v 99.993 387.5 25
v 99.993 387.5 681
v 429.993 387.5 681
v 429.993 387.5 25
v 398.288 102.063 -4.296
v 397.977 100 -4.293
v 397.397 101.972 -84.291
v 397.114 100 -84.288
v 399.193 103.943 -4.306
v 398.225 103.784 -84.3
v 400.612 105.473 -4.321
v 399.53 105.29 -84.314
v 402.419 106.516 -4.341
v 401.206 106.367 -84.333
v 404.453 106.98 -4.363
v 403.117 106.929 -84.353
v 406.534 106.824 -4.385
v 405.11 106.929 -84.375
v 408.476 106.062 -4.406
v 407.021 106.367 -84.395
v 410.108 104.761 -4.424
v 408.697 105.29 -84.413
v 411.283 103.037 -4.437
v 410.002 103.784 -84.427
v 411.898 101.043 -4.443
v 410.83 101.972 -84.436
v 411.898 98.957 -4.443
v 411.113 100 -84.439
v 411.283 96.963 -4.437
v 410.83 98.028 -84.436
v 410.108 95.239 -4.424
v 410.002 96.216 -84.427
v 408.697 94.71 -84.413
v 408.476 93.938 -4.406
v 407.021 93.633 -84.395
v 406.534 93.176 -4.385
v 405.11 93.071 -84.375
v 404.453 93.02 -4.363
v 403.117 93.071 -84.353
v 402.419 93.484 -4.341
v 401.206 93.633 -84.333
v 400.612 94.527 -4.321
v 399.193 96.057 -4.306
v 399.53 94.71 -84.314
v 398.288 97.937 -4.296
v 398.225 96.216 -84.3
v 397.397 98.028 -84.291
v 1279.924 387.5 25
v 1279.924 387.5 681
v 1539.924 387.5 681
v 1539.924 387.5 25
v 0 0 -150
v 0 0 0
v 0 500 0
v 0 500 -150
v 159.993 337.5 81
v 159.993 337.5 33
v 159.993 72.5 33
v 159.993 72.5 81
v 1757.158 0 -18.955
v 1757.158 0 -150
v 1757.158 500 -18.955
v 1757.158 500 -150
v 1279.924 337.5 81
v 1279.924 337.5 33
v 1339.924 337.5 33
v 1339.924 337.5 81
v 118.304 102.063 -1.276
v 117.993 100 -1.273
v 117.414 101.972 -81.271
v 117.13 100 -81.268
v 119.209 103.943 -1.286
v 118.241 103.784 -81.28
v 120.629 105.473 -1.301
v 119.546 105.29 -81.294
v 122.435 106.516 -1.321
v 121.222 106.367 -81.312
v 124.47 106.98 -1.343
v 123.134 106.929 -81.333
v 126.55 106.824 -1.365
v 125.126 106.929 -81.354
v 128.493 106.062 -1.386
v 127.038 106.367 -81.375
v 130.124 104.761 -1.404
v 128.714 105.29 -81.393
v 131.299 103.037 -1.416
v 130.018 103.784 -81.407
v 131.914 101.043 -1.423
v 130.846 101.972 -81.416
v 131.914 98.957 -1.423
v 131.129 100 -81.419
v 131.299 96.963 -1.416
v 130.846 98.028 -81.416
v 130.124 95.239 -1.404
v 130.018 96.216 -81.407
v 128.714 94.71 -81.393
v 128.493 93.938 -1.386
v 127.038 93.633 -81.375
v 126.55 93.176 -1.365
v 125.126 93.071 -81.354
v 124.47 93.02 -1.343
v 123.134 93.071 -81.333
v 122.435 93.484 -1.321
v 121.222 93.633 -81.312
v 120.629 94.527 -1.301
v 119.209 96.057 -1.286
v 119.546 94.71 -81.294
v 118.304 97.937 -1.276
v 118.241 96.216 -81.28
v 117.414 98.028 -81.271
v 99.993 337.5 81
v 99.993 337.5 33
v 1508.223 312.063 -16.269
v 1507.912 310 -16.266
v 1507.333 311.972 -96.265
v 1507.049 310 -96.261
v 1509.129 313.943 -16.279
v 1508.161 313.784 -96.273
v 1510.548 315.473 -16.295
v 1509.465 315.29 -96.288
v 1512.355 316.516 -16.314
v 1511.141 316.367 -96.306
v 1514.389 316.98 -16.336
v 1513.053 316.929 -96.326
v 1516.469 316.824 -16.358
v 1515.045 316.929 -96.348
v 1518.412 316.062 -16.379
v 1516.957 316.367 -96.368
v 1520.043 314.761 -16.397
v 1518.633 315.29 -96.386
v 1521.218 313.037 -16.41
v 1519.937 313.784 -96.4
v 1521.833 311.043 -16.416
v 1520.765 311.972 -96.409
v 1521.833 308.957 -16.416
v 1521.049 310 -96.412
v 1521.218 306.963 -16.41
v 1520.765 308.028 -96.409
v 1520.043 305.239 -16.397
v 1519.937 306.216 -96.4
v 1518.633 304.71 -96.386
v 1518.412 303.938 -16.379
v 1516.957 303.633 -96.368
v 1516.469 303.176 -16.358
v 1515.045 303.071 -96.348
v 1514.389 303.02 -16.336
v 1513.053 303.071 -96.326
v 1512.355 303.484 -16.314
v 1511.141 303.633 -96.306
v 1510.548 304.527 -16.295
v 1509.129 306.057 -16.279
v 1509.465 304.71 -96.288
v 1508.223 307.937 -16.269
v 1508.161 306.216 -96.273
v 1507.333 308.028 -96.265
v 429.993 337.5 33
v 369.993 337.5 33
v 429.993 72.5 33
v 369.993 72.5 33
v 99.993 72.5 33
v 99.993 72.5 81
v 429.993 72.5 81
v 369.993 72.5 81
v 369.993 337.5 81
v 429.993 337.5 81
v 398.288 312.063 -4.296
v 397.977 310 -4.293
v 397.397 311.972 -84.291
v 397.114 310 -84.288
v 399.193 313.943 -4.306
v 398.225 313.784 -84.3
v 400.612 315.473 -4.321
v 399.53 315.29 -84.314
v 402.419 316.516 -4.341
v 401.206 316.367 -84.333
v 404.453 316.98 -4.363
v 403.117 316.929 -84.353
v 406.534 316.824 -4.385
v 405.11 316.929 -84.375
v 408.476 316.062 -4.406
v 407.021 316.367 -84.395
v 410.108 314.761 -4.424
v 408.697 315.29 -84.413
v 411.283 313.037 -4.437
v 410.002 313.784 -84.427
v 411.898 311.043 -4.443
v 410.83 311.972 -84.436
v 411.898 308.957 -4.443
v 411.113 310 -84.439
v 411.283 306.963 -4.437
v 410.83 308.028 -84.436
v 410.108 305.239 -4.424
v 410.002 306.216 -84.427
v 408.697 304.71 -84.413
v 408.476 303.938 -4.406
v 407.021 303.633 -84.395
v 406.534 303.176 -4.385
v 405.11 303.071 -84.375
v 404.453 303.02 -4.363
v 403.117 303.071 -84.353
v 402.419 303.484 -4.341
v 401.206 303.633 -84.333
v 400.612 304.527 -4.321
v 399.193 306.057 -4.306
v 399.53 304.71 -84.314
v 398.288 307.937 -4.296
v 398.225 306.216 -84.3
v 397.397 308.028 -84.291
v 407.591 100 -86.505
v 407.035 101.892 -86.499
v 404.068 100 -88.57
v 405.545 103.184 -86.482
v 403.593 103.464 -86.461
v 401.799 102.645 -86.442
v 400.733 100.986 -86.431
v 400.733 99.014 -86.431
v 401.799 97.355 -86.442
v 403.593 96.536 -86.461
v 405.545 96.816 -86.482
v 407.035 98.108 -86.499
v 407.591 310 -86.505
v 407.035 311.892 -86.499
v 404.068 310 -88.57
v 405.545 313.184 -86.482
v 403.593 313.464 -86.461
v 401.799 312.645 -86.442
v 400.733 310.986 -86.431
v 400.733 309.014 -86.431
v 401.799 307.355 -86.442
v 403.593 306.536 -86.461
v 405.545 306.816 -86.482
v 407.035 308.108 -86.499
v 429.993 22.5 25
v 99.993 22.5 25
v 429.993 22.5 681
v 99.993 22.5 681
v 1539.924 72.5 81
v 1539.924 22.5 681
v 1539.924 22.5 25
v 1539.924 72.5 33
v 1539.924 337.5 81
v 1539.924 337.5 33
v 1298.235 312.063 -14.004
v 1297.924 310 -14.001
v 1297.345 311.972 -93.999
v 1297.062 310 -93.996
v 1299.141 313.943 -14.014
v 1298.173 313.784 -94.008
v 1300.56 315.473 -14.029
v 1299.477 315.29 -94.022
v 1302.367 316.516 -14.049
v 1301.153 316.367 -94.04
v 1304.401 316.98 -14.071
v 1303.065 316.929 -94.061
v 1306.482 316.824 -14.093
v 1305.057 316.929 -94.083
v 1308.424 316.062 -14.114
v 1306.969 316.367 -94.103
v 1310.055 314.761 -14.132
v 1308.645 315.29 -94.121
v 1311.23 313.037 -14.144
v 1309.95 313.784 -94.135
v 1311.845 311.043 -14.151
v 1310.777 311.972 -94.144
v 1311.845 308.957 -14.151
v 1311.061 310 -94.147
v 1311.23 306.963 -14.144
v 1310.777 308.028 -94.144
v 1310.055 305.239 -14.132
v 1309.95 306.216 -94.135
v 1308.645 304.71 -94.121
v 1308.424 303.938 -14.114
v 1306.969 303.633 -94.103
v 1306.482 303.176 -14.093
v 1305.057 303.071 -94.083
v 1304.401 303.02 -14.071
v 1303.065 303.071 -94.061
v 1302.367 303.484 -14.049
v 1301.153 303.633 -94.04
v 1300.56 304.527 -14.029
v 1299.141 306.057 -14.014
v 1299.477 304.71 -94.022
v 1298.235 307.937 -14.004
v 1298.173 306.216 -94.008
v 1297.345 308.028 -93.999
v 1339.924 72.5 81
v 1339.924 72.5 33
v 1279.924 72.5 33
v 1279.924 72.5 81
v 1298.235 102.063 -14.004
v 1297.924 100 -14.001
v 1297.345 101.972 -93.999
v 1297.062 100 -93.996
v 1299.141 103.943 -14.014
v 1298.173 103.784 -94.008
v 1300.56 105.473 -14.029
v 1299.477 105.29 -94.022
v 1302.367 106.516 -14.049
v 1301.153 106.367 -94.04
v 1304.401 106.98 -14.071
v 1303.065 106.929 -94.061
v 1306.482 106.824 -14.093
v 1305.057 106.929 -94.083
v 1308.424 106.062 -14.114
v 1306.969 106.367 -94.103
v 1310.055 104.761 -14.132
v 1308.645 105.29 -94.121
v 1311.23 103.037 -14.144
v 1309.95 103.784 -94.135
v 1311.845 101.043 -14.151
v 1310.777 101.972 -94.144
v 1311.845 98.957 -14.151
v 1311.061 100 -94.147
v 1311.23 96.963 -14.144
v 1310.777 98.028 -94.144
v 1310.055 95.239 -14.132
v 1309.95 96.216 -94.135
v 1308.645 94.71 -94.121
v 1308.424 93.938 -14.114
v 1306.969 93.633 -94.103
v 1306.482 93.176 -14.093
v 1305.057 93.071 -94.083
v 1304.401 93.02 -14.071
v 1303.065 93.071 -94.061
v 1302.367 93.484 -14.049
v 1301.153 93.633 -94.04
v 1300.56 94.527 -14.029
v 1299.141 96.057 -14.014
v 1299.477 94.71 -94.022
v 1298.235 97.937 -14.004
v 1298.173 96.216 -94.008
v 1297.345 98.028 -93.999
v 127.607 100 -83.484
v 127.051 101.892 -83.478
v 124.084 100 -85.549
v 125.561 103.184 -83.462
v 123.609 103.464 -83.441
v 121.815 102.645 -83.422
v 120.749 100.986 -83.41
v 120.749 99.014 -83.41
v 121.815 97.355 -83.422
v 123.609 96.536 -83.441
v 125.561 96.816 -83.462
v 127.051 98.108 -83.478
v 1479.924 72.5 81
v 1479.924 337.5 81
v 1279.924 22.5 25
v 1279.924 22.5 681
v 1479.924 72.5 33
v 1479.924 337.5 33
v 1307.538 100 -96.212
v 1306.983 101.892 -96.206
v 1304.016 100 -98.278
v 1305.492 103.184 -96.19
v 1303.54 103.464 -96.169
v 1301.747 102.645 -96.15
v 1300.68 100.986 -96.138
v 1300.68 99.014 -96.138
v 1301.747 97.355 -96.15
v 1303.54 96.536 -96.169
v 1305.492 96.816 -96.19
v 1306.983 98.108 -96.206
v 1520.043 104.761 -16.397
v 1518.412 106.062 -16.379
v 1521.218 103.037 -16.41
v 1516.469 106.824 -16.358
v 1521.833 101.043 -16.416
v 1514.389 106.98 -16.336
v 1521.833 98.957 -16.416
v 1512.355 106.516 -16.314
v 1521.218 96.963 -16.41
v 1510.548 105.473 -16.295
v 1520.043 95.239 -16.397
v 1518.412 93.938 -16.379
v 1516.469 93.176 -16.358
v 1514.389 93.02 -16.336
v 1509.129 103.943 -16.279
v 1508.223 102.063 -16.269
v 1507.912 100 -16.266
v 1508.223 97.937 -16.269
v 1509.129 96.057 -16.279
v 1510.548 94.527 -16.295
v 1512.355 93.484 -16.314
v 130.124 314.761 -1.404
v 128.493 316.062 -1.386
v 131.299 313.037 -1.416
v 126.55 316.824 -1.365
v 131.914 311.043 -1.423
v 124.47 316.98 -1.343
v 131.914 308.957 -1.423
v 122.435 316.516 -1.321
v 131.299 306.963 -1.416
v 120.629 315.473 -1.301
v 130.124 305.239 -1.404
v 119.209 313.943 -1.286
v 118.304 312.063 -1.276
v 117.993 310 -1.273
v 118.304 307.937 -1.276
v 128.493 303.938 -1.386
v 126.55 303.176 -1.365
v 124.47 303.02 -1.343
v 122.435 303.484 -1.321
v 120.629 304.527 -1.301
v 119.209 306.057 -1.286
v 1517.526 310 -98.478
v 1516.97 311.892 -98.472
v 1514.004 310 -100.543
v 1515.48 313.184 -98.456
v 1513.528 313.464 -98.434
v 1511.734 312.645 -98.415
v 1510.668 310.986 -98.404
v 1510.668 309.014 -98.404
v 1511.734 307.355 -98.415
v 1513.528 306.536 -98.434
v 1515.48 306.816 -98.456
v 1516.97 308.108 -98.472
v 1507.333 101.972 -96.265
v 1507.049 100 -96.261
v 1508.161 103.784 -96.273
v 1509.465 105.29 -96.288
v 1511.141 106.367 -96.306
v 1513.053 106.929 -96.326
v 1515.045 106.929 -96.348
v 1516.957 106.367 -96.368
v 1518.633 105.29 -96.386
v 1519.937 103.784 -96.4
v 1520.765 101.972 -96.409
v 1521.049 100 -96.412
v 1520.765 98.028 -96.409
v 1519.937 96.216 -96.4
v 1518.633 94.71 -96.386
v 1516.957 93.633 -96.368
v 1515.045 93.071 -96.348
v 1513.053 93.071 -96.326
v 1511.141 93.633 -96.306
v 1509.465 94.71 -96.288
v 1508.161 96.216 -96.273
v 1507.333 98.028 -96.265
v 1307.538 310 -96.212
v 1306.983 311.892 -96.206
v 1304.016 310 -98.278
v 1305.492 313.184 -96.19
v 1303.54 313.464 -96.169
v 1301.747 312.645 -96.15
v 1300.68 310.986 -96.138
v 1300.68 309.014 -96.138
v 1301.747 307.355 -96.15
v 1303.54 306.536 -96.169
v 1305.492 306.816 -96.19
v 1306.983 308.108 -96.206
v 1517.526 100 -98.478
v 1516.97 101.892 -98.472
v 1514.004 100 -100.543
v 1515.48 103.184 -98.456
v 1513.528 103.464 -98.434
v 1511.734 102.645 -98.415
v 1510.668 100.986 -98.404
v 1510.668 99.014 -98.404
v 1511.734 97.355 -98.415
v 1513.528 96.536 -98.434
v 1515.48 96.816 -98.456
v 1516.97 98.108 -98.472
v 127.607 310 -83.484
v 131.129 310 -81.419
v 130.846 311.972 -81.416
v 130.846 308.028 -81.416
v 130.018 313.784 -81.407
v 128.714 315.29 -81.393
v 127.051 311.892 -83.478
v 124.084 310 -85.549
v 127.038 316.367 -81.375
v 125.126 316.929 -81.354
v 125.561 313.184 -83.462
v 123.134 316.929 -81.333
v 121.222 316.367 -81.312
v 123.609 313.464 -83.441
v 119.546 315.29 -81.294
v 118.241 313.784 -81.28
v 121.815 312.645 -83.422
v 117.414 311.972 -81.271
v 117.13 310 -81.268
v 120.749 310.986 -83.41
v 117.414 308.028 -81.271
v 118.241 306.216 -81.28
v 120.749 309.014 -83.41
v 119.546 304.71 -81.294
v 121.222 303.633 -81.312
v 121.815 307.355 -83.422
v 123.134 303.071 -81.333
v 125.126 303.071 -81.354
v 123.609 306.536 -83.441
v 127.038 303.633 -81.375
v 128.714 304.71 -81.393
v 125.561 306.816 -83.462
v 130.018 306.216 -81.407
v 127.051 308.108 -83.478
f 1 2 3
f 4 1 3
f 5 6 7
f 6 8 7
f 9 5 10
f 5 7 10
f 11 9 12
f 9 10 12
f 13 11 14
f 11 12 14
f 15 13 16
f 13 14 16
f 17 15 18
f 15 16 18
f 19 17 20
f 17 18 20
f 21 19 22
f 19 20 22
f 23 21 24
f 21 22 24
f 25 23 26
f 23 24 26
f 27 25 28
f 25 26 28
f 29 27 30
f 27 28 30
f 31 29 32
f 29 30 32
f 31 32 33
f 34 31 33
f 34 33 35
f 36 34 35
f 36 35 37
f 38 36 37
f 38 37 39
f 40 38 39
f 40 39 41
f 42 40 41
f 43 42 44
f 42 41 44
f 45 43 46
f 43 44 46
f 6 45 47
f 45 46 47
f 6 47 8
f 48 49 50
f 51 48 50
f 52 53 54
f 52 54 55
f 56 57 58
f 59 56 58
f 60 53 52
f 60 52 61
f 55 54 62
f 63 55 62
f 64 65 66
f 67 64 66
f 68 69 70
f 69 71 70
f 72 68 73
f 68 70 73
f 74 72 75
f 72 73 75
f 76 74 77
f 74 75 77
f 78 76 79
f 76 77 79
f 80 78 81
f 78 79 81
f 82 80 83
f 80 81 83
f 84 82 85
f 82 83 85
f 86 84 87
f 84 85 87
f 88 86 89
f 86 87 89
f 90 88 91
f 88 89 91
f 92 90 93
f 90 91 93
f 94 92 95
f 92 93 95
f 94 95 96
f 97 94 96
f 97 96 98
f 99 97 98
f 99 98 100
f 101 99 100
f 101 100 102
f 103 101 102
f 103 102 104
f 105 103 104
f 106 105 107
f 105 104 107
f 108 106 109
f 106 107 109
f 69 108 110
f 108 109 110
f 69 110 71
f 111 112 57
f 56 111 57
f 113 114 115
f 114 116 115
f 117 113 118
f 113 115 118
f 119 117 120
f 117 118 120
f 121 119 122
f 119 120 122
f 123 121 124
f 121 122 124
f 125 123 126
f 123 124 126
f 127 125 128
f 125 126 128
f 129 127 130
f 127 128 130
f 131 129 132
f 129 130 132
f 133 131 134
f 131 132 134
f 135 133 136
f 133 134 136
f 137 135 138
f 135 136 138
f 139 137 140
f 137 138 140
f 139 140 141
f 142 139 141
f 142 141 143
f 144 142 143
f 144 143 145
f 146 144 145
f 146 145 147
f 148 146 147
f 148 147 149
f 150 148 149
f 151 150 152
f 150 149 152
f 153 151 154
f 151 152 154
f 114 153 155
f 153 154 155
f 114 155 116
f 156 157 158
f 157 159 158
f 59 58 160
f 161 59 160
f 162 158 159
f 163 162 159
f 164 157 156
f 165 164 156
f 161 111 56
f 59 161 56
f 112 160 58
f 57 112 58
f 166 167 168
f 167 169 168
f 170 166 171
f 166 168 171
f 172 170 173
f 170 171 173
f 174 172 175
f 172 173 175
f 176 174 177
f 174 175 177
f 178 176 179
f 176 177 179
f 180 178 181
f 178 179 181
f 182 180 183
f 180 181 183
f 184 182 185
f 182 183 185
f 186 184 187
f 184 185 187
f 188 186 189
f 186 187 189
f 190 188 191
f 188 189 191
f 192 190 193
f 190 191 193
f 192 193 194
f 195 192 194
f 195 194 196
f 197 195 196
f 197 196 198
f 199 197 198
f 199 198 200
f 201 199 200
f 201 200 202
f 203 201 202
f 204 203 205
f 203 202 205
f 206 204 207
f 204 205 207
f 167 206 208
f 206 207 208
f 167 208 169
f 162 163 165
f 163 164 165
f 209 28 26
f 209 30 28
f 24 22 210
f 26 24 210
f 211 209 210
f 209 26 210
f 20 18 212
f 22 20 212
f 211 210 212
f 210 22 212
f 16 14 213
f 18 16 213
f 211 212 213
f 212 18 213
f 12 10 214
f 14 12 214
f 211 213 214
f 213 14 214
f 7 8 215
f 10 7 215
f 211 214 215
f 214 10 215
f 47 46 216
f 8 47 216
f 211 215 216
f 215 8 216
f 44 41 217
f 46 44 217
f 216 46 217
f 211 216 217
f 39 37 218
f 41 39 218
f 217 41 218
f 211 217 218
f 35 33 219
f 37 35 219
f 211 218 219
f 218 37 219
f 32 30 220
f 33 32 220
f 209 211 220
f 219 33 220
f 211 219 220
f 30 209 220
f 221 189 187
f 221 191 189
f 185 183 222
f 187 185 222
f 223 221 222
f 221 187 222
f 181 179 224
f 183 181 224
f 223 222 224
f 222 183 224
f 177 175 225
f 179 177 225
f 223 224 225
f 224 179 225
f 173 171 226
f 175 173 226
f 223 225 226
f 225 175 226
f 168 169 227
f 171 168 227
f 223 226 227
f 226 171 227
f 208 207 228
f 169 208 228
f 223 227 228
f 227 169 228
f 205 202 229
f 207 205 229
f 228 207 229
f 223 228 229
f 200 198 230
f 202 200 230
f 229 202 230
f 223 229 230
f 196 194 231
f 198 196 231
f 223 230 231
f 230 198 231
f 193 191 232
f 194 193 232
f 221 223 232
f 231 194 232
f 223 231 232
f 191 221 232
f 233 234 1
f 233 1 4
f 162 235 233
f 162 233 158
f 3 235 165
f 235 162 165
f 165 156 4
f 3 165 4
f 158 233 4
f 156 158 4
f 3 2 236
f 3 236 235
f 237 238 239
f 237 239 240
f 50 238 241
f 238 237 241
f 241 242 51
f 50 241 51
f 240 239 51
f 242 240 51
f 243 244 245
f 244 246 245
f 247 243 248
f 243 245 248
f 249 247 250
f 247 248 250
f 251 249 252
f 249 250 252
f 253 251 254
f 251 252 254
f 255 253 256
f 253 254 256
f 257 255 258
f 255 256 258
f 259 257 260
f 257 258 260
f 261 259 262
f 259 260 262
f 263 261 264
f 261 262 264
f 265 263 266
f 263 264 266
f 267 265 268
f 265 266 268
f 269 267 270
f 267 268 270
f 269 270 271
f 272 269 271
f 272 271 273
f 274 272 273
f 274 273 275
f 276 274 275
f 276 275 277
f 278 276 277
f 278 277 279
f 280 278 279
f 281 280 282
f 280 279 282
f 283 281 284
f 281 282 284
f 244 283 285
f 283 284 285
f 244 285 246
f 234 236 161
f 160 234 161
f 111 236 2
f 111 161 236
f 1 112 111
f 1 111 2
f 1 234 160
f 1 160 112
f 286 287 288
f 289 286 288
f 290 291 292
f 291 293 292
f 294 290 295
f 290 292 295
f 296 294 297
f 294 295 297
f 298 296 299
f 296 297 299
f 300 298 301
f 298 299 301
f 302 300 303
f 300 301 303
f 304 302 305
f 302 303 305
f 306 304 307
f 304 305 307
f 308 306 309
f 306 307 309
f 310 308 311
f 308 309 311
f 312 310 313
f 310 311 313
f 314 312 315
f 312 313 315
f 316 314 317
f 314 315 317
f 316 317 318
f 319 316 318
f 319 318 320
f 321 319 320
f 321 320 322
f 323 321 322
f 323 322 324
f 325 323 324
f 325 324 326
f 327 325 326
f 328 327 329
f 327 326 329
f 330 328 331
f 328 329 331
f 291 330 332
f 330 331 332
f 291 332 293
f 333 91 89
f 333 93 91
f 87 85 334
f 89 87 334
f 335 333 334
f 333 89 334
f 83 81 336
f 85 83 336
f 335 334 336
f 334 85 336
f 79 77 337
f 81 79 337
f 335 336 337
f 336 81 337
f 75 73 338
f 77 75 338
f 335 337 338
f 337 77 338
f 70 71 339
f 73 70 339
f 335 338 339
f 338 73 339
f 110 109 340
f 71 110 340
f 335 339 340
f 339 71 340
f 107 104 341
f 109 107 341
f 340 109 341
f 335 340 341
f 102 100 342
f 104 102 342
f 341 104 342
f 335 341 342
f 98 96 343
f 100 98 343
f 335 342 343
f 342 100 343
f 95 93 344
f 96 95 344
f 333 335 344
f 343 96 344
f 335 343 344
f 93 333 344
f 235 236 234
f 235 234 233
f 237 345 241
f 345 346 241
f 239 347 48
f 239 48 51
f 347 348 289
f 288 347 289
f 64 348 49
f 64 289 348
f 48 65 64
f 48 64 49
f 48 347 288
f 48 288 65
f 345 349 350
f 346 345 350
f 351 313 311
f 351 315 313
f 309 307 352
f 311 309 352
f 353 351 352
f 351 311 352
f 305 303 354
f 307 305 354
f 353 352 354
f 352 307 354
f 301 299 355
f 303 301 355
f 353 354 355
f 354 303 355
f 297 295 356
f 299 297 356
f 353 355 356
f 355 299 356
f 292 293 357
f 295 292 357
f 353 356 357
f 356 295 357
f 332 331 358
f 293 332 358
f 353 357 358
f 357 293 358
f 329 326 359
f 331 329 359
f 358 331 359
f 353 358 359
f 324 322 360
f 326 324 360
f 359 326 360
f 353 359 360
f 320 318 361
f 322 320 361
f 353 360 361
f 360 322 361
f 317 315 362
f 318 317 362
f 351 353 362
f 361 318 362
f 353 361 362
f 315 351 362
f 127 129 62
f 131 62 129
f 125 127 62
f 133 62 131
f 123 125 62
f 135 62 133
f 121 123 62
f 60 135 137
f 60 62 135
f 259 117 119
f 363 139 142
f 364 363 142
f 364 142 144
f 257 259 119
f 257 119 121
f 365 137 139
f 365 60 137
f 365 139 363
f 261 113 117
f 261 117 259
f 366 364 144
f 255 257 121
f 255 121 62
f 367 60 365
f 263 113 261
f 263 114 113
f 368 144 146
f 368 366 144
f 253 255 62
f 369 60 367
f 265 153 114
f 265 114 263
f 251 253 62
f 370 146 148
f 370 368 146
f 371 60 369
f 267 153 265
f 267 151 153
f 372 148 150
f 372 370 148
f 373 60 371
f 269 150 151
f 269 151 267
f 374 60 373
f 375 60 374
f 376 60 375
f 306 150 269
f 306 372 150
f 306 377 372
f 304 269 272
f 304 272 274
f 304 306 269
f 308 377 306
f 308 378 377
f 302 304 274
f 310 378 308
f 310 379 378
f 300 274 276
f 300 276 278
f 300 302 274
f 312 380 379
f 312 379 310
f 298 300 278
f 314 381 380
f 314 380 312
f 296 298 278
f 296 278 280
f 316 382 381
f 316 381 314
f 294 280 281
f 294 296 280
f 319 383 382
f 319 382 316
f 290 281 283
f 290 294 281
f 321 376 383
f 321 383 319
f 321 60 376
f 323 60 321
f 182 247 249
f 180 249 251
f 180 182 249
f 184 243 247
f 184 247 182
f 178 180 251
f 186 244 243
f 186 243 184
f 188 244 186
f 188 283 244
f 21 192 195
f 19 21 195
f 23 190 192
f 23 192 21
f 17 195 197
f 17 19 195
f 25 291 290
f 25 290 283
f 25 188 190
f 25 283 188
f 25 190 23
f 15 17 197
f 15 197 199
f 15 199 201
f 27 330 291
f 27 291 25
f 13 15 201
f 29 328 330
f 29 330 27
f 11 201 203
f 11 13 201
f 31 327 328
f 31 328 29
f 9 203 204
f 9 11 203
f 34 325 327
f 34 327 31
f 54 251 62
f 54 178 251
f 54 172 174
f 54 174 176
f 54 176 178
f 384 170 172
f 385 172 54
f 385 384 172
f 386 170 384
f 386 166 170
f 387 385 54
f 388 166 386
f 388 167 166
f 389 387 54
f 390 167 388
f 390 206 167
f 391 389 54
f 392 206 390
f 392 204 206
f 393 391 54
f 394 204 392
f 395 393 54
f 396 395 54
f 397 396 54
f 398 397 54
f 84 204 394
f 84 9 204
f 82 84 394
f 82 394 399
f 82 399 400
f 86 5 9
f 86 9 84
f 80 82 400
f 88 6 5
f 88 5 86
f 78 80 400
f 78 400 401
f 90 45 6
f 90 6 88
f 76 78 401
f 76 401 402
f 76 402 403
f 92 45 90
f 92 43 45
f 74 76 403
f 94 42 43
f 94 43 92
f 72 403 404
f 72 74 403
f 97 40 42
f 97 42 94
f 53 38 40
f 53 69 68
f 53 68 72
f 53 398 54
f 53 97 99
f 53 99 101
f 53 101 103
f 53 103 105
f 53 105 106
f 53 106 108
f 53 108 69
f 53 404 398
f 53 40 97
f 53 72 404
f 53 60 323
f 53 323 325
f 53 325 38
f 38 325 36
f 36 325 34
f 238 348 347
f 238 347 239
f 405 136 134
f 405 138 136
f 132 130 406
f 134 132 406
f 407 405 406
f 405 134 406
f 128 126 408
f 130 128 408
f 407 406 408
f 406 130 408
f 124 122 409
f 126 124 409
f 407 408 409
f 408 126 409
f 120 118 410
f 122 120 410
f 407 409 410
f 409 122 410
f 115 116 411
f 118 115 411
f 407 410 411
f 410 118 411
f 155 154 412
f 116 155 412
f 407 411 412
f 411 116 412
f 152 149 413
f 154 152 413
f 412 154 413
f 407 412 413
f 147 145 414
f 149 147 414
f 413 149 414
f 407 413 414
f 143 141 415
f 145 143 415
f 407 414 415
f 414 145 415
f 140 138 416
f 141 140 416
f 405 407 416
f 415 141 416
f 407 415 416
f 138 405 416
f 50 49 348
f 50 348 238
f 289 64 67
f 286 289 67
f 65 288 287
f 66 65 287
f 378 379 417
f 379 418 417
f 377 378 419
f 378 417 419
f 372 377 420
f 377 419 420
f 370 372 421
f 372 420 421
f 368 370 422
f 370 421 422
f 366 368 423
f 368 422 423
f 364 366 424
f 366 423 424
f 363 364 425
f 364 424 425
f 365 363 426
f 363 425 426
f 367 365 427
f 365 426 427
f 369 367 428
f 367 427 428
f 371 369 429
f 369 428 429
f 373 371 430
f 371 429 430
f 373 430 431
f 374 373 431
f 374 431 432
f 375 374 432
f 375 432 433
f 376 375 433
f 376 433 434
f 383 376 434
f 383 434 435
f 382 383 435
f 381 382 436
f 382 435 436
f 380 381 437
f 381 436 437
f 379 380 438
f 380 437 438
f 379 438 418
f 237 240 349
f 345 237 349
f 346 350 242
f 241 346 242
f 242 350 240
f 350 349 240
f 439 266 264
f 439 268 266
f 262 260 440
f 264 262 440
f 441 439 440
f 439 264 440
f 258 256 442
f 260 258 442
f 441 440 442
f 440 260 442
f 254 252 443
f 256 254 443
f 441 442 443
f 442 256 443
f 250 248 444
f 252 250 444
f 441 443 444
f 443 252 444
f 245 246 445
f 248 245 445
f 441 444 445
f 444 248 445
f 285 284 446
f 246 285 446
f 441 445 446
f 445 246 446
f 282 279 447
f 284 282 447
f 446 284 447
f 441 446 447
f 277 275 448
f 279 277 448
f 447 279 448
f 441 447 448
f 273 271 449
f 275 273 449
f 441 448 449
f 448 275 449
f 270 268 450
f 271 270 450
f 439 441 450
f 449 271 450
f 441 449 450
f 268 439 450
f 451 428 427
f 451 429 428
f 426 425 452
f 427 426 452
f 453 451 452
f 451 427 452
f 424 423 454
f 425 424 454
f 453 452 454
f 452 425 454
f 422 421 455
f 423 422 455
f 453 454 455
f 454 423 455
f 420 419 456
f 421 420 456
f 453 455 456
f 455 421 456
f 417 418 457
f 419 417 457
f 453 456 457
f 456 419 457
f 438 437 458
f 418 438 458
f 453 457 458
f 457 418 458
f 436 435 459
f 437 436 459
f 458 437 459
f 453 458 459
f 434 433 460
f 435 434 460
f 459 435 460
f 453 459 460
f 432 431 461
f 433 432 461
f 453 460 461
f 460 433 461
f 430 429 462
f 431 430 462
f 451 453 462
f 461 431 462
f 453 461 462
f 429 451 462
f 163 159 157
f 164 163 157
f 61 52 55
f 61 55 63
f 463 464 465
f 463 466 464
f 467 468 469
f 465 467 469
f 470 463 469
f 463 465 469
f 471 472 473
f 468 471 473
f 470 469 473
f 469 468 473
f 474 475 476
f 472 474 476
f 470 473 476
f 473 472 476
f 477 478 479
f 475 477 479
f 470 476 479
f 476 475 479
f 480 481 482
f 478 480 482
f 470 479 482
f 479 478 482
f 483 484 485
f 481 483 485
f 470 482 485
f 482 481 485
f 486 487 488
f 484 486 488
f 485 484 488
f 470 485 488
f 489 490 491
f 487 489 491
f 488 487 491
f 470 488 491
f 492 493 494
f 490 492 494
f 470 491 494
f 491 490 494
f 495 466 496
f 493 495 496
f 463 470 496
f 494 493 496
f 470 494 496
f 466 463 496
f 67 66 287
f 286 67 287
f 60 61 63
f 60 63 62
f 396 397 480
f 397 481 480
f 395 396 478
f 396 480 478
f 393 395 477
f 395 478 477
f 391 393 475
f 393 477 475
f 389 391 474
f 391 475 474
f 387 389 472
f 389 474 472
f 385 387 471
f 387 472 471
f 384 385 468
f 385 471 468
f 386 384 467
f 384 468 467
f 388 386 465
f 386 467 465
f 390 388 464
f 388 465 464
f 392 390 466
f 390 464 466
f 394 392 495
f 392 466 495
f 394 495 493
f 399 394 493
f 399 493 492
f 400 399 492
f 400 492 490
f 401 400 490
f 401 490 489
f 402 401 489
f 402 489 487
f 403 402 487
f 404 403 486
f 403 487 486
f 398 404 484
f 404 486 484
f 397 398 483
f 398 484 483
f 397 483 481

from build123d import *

# Parameters (mm, degrees)
F1_DEPTH  = 500
F3_D      = 14
F3_DEPTH  = 80
F3_TIP    = 4.2060243332
F5_W      = 330
F5_H      = 365
F6_DEPTH  = 8
F5_W_2    = 260
F9_DEPTH  = 48
F11_W     = 260
F11_H     = 365
F12_DEPTH = 600
F10_W     = 330
F10_H     = 365


with BuildPart() as f1:
    # F0 (on Front) → F1 (new body)
    with BuildSketch(Plane.XZ):
        Polygon((1757.1579754596, -18.9547816518), (0, 0), (0, -150), (1757.1579754596, -150), align=None)
    extrude(amount=-F1_DEPTH)

    # F3
    with Locations(Plane(origin=(0, 0, 0), x_dir=(0.9999418234, 0, -0.0107865537), z_dir=(0.0107865537, 0, 0.9999418234))):
        with Locations((125, 310), (125, 100), (405, 100), (405, 310), (1305, 100), (1515, 100), (1515, 310), (1305, 310)):
            Hole(F3_D / 2, depth=F3_DEPTH)
            with Locations((0, 0, -(F3_DEPTH + F3_TIP / 2))):  # 118° drill point
                Cone(0, F3_D / 2, F3_TIP, mode=Mode.SUBTRACT)


with BuildPart() as f6:
    # F5 (on offset) → F6 (new body)
    with BuildSketch(Plane(origin=(0, 0, 25), x_dir=(1, 0, 0), z_dir=(0, 0, -1))):
        with Locations((264.9927279296, -205)):
            Rectangle(F5_W, F5_H)
    extrude(amount=-F6_DEPTH)

    # F7 (on face) → F9, piece 2 (join)
    with BuildSketch(Plane.XY.offset(33)):
        Polygon((99.9927279296, 387.5), (99.9927279296, 337.5), (159.9927279296, 337.5), (159.9927279296, 72.5), (99.9927279296, 72.5), (99.9927279296, 22.5), (429.9927279296, 22.5), (429.9927279296, 72.5), (369.9927279296, 72.5), (369.9927279296, 337.5), (429.9927279296, 337.5), (429.9927279296, 387.5), align=None)
    extrude(amount=F9_DEPTH)

    # F10 (on face) → F12, piece 2 (join)
    with BuildSketch(Plane.XY.offset(81)):
        with Locations((264.9927279296, 205)):
            Rectangle(F10_W, F10_H)
    extrude(amount=F12_DEPTH)


with BuildPart() as f6b:
    # F5 (on offset) → F6, piece 2 (new body)
    with BuildSketch(Plane(origin=(0, 0, 25), x_dir=(1, 0, 0), z_dir=(0, 0, -1))):
        with Locations((1409.9240795853, -205)):
            Rectangle(F5_W_2, F5_H)
    extrude(amount=-F6_DEPTH)

    # F8 (on face) → F9 (join)
    with BuildSketch(Plane.XY.offset(33)):
        Polygon((1279.9240795853, 387.5), (1279.9240795853, 337.5), (1339.9240795853, 337.5), (1339.9240795853, 72.5), (1279.9240795853, 72.5), (1279.9240795853, 22.5), (1539.9240795853, 22.5), (1539.9240795853, 72.5), (1479.9240795853, 72.5), (1479.9240795853, 337.5), (1539.9240795853, 337.5), (1539.9240795853, 387.5), align=None)
    extrude(amount=F9_DEPTH)

    # F11 (on face) → F12 (join)
    with BuildSketch(Plane.XY.offset(81)):
        with Locations((1409.9240795853, 205)):
            Rectangle(F11_W, F11_H)
    extrude(amount=F12_DEPTH)


solid = Compound([f1.part, f6.part, f6b.part])
